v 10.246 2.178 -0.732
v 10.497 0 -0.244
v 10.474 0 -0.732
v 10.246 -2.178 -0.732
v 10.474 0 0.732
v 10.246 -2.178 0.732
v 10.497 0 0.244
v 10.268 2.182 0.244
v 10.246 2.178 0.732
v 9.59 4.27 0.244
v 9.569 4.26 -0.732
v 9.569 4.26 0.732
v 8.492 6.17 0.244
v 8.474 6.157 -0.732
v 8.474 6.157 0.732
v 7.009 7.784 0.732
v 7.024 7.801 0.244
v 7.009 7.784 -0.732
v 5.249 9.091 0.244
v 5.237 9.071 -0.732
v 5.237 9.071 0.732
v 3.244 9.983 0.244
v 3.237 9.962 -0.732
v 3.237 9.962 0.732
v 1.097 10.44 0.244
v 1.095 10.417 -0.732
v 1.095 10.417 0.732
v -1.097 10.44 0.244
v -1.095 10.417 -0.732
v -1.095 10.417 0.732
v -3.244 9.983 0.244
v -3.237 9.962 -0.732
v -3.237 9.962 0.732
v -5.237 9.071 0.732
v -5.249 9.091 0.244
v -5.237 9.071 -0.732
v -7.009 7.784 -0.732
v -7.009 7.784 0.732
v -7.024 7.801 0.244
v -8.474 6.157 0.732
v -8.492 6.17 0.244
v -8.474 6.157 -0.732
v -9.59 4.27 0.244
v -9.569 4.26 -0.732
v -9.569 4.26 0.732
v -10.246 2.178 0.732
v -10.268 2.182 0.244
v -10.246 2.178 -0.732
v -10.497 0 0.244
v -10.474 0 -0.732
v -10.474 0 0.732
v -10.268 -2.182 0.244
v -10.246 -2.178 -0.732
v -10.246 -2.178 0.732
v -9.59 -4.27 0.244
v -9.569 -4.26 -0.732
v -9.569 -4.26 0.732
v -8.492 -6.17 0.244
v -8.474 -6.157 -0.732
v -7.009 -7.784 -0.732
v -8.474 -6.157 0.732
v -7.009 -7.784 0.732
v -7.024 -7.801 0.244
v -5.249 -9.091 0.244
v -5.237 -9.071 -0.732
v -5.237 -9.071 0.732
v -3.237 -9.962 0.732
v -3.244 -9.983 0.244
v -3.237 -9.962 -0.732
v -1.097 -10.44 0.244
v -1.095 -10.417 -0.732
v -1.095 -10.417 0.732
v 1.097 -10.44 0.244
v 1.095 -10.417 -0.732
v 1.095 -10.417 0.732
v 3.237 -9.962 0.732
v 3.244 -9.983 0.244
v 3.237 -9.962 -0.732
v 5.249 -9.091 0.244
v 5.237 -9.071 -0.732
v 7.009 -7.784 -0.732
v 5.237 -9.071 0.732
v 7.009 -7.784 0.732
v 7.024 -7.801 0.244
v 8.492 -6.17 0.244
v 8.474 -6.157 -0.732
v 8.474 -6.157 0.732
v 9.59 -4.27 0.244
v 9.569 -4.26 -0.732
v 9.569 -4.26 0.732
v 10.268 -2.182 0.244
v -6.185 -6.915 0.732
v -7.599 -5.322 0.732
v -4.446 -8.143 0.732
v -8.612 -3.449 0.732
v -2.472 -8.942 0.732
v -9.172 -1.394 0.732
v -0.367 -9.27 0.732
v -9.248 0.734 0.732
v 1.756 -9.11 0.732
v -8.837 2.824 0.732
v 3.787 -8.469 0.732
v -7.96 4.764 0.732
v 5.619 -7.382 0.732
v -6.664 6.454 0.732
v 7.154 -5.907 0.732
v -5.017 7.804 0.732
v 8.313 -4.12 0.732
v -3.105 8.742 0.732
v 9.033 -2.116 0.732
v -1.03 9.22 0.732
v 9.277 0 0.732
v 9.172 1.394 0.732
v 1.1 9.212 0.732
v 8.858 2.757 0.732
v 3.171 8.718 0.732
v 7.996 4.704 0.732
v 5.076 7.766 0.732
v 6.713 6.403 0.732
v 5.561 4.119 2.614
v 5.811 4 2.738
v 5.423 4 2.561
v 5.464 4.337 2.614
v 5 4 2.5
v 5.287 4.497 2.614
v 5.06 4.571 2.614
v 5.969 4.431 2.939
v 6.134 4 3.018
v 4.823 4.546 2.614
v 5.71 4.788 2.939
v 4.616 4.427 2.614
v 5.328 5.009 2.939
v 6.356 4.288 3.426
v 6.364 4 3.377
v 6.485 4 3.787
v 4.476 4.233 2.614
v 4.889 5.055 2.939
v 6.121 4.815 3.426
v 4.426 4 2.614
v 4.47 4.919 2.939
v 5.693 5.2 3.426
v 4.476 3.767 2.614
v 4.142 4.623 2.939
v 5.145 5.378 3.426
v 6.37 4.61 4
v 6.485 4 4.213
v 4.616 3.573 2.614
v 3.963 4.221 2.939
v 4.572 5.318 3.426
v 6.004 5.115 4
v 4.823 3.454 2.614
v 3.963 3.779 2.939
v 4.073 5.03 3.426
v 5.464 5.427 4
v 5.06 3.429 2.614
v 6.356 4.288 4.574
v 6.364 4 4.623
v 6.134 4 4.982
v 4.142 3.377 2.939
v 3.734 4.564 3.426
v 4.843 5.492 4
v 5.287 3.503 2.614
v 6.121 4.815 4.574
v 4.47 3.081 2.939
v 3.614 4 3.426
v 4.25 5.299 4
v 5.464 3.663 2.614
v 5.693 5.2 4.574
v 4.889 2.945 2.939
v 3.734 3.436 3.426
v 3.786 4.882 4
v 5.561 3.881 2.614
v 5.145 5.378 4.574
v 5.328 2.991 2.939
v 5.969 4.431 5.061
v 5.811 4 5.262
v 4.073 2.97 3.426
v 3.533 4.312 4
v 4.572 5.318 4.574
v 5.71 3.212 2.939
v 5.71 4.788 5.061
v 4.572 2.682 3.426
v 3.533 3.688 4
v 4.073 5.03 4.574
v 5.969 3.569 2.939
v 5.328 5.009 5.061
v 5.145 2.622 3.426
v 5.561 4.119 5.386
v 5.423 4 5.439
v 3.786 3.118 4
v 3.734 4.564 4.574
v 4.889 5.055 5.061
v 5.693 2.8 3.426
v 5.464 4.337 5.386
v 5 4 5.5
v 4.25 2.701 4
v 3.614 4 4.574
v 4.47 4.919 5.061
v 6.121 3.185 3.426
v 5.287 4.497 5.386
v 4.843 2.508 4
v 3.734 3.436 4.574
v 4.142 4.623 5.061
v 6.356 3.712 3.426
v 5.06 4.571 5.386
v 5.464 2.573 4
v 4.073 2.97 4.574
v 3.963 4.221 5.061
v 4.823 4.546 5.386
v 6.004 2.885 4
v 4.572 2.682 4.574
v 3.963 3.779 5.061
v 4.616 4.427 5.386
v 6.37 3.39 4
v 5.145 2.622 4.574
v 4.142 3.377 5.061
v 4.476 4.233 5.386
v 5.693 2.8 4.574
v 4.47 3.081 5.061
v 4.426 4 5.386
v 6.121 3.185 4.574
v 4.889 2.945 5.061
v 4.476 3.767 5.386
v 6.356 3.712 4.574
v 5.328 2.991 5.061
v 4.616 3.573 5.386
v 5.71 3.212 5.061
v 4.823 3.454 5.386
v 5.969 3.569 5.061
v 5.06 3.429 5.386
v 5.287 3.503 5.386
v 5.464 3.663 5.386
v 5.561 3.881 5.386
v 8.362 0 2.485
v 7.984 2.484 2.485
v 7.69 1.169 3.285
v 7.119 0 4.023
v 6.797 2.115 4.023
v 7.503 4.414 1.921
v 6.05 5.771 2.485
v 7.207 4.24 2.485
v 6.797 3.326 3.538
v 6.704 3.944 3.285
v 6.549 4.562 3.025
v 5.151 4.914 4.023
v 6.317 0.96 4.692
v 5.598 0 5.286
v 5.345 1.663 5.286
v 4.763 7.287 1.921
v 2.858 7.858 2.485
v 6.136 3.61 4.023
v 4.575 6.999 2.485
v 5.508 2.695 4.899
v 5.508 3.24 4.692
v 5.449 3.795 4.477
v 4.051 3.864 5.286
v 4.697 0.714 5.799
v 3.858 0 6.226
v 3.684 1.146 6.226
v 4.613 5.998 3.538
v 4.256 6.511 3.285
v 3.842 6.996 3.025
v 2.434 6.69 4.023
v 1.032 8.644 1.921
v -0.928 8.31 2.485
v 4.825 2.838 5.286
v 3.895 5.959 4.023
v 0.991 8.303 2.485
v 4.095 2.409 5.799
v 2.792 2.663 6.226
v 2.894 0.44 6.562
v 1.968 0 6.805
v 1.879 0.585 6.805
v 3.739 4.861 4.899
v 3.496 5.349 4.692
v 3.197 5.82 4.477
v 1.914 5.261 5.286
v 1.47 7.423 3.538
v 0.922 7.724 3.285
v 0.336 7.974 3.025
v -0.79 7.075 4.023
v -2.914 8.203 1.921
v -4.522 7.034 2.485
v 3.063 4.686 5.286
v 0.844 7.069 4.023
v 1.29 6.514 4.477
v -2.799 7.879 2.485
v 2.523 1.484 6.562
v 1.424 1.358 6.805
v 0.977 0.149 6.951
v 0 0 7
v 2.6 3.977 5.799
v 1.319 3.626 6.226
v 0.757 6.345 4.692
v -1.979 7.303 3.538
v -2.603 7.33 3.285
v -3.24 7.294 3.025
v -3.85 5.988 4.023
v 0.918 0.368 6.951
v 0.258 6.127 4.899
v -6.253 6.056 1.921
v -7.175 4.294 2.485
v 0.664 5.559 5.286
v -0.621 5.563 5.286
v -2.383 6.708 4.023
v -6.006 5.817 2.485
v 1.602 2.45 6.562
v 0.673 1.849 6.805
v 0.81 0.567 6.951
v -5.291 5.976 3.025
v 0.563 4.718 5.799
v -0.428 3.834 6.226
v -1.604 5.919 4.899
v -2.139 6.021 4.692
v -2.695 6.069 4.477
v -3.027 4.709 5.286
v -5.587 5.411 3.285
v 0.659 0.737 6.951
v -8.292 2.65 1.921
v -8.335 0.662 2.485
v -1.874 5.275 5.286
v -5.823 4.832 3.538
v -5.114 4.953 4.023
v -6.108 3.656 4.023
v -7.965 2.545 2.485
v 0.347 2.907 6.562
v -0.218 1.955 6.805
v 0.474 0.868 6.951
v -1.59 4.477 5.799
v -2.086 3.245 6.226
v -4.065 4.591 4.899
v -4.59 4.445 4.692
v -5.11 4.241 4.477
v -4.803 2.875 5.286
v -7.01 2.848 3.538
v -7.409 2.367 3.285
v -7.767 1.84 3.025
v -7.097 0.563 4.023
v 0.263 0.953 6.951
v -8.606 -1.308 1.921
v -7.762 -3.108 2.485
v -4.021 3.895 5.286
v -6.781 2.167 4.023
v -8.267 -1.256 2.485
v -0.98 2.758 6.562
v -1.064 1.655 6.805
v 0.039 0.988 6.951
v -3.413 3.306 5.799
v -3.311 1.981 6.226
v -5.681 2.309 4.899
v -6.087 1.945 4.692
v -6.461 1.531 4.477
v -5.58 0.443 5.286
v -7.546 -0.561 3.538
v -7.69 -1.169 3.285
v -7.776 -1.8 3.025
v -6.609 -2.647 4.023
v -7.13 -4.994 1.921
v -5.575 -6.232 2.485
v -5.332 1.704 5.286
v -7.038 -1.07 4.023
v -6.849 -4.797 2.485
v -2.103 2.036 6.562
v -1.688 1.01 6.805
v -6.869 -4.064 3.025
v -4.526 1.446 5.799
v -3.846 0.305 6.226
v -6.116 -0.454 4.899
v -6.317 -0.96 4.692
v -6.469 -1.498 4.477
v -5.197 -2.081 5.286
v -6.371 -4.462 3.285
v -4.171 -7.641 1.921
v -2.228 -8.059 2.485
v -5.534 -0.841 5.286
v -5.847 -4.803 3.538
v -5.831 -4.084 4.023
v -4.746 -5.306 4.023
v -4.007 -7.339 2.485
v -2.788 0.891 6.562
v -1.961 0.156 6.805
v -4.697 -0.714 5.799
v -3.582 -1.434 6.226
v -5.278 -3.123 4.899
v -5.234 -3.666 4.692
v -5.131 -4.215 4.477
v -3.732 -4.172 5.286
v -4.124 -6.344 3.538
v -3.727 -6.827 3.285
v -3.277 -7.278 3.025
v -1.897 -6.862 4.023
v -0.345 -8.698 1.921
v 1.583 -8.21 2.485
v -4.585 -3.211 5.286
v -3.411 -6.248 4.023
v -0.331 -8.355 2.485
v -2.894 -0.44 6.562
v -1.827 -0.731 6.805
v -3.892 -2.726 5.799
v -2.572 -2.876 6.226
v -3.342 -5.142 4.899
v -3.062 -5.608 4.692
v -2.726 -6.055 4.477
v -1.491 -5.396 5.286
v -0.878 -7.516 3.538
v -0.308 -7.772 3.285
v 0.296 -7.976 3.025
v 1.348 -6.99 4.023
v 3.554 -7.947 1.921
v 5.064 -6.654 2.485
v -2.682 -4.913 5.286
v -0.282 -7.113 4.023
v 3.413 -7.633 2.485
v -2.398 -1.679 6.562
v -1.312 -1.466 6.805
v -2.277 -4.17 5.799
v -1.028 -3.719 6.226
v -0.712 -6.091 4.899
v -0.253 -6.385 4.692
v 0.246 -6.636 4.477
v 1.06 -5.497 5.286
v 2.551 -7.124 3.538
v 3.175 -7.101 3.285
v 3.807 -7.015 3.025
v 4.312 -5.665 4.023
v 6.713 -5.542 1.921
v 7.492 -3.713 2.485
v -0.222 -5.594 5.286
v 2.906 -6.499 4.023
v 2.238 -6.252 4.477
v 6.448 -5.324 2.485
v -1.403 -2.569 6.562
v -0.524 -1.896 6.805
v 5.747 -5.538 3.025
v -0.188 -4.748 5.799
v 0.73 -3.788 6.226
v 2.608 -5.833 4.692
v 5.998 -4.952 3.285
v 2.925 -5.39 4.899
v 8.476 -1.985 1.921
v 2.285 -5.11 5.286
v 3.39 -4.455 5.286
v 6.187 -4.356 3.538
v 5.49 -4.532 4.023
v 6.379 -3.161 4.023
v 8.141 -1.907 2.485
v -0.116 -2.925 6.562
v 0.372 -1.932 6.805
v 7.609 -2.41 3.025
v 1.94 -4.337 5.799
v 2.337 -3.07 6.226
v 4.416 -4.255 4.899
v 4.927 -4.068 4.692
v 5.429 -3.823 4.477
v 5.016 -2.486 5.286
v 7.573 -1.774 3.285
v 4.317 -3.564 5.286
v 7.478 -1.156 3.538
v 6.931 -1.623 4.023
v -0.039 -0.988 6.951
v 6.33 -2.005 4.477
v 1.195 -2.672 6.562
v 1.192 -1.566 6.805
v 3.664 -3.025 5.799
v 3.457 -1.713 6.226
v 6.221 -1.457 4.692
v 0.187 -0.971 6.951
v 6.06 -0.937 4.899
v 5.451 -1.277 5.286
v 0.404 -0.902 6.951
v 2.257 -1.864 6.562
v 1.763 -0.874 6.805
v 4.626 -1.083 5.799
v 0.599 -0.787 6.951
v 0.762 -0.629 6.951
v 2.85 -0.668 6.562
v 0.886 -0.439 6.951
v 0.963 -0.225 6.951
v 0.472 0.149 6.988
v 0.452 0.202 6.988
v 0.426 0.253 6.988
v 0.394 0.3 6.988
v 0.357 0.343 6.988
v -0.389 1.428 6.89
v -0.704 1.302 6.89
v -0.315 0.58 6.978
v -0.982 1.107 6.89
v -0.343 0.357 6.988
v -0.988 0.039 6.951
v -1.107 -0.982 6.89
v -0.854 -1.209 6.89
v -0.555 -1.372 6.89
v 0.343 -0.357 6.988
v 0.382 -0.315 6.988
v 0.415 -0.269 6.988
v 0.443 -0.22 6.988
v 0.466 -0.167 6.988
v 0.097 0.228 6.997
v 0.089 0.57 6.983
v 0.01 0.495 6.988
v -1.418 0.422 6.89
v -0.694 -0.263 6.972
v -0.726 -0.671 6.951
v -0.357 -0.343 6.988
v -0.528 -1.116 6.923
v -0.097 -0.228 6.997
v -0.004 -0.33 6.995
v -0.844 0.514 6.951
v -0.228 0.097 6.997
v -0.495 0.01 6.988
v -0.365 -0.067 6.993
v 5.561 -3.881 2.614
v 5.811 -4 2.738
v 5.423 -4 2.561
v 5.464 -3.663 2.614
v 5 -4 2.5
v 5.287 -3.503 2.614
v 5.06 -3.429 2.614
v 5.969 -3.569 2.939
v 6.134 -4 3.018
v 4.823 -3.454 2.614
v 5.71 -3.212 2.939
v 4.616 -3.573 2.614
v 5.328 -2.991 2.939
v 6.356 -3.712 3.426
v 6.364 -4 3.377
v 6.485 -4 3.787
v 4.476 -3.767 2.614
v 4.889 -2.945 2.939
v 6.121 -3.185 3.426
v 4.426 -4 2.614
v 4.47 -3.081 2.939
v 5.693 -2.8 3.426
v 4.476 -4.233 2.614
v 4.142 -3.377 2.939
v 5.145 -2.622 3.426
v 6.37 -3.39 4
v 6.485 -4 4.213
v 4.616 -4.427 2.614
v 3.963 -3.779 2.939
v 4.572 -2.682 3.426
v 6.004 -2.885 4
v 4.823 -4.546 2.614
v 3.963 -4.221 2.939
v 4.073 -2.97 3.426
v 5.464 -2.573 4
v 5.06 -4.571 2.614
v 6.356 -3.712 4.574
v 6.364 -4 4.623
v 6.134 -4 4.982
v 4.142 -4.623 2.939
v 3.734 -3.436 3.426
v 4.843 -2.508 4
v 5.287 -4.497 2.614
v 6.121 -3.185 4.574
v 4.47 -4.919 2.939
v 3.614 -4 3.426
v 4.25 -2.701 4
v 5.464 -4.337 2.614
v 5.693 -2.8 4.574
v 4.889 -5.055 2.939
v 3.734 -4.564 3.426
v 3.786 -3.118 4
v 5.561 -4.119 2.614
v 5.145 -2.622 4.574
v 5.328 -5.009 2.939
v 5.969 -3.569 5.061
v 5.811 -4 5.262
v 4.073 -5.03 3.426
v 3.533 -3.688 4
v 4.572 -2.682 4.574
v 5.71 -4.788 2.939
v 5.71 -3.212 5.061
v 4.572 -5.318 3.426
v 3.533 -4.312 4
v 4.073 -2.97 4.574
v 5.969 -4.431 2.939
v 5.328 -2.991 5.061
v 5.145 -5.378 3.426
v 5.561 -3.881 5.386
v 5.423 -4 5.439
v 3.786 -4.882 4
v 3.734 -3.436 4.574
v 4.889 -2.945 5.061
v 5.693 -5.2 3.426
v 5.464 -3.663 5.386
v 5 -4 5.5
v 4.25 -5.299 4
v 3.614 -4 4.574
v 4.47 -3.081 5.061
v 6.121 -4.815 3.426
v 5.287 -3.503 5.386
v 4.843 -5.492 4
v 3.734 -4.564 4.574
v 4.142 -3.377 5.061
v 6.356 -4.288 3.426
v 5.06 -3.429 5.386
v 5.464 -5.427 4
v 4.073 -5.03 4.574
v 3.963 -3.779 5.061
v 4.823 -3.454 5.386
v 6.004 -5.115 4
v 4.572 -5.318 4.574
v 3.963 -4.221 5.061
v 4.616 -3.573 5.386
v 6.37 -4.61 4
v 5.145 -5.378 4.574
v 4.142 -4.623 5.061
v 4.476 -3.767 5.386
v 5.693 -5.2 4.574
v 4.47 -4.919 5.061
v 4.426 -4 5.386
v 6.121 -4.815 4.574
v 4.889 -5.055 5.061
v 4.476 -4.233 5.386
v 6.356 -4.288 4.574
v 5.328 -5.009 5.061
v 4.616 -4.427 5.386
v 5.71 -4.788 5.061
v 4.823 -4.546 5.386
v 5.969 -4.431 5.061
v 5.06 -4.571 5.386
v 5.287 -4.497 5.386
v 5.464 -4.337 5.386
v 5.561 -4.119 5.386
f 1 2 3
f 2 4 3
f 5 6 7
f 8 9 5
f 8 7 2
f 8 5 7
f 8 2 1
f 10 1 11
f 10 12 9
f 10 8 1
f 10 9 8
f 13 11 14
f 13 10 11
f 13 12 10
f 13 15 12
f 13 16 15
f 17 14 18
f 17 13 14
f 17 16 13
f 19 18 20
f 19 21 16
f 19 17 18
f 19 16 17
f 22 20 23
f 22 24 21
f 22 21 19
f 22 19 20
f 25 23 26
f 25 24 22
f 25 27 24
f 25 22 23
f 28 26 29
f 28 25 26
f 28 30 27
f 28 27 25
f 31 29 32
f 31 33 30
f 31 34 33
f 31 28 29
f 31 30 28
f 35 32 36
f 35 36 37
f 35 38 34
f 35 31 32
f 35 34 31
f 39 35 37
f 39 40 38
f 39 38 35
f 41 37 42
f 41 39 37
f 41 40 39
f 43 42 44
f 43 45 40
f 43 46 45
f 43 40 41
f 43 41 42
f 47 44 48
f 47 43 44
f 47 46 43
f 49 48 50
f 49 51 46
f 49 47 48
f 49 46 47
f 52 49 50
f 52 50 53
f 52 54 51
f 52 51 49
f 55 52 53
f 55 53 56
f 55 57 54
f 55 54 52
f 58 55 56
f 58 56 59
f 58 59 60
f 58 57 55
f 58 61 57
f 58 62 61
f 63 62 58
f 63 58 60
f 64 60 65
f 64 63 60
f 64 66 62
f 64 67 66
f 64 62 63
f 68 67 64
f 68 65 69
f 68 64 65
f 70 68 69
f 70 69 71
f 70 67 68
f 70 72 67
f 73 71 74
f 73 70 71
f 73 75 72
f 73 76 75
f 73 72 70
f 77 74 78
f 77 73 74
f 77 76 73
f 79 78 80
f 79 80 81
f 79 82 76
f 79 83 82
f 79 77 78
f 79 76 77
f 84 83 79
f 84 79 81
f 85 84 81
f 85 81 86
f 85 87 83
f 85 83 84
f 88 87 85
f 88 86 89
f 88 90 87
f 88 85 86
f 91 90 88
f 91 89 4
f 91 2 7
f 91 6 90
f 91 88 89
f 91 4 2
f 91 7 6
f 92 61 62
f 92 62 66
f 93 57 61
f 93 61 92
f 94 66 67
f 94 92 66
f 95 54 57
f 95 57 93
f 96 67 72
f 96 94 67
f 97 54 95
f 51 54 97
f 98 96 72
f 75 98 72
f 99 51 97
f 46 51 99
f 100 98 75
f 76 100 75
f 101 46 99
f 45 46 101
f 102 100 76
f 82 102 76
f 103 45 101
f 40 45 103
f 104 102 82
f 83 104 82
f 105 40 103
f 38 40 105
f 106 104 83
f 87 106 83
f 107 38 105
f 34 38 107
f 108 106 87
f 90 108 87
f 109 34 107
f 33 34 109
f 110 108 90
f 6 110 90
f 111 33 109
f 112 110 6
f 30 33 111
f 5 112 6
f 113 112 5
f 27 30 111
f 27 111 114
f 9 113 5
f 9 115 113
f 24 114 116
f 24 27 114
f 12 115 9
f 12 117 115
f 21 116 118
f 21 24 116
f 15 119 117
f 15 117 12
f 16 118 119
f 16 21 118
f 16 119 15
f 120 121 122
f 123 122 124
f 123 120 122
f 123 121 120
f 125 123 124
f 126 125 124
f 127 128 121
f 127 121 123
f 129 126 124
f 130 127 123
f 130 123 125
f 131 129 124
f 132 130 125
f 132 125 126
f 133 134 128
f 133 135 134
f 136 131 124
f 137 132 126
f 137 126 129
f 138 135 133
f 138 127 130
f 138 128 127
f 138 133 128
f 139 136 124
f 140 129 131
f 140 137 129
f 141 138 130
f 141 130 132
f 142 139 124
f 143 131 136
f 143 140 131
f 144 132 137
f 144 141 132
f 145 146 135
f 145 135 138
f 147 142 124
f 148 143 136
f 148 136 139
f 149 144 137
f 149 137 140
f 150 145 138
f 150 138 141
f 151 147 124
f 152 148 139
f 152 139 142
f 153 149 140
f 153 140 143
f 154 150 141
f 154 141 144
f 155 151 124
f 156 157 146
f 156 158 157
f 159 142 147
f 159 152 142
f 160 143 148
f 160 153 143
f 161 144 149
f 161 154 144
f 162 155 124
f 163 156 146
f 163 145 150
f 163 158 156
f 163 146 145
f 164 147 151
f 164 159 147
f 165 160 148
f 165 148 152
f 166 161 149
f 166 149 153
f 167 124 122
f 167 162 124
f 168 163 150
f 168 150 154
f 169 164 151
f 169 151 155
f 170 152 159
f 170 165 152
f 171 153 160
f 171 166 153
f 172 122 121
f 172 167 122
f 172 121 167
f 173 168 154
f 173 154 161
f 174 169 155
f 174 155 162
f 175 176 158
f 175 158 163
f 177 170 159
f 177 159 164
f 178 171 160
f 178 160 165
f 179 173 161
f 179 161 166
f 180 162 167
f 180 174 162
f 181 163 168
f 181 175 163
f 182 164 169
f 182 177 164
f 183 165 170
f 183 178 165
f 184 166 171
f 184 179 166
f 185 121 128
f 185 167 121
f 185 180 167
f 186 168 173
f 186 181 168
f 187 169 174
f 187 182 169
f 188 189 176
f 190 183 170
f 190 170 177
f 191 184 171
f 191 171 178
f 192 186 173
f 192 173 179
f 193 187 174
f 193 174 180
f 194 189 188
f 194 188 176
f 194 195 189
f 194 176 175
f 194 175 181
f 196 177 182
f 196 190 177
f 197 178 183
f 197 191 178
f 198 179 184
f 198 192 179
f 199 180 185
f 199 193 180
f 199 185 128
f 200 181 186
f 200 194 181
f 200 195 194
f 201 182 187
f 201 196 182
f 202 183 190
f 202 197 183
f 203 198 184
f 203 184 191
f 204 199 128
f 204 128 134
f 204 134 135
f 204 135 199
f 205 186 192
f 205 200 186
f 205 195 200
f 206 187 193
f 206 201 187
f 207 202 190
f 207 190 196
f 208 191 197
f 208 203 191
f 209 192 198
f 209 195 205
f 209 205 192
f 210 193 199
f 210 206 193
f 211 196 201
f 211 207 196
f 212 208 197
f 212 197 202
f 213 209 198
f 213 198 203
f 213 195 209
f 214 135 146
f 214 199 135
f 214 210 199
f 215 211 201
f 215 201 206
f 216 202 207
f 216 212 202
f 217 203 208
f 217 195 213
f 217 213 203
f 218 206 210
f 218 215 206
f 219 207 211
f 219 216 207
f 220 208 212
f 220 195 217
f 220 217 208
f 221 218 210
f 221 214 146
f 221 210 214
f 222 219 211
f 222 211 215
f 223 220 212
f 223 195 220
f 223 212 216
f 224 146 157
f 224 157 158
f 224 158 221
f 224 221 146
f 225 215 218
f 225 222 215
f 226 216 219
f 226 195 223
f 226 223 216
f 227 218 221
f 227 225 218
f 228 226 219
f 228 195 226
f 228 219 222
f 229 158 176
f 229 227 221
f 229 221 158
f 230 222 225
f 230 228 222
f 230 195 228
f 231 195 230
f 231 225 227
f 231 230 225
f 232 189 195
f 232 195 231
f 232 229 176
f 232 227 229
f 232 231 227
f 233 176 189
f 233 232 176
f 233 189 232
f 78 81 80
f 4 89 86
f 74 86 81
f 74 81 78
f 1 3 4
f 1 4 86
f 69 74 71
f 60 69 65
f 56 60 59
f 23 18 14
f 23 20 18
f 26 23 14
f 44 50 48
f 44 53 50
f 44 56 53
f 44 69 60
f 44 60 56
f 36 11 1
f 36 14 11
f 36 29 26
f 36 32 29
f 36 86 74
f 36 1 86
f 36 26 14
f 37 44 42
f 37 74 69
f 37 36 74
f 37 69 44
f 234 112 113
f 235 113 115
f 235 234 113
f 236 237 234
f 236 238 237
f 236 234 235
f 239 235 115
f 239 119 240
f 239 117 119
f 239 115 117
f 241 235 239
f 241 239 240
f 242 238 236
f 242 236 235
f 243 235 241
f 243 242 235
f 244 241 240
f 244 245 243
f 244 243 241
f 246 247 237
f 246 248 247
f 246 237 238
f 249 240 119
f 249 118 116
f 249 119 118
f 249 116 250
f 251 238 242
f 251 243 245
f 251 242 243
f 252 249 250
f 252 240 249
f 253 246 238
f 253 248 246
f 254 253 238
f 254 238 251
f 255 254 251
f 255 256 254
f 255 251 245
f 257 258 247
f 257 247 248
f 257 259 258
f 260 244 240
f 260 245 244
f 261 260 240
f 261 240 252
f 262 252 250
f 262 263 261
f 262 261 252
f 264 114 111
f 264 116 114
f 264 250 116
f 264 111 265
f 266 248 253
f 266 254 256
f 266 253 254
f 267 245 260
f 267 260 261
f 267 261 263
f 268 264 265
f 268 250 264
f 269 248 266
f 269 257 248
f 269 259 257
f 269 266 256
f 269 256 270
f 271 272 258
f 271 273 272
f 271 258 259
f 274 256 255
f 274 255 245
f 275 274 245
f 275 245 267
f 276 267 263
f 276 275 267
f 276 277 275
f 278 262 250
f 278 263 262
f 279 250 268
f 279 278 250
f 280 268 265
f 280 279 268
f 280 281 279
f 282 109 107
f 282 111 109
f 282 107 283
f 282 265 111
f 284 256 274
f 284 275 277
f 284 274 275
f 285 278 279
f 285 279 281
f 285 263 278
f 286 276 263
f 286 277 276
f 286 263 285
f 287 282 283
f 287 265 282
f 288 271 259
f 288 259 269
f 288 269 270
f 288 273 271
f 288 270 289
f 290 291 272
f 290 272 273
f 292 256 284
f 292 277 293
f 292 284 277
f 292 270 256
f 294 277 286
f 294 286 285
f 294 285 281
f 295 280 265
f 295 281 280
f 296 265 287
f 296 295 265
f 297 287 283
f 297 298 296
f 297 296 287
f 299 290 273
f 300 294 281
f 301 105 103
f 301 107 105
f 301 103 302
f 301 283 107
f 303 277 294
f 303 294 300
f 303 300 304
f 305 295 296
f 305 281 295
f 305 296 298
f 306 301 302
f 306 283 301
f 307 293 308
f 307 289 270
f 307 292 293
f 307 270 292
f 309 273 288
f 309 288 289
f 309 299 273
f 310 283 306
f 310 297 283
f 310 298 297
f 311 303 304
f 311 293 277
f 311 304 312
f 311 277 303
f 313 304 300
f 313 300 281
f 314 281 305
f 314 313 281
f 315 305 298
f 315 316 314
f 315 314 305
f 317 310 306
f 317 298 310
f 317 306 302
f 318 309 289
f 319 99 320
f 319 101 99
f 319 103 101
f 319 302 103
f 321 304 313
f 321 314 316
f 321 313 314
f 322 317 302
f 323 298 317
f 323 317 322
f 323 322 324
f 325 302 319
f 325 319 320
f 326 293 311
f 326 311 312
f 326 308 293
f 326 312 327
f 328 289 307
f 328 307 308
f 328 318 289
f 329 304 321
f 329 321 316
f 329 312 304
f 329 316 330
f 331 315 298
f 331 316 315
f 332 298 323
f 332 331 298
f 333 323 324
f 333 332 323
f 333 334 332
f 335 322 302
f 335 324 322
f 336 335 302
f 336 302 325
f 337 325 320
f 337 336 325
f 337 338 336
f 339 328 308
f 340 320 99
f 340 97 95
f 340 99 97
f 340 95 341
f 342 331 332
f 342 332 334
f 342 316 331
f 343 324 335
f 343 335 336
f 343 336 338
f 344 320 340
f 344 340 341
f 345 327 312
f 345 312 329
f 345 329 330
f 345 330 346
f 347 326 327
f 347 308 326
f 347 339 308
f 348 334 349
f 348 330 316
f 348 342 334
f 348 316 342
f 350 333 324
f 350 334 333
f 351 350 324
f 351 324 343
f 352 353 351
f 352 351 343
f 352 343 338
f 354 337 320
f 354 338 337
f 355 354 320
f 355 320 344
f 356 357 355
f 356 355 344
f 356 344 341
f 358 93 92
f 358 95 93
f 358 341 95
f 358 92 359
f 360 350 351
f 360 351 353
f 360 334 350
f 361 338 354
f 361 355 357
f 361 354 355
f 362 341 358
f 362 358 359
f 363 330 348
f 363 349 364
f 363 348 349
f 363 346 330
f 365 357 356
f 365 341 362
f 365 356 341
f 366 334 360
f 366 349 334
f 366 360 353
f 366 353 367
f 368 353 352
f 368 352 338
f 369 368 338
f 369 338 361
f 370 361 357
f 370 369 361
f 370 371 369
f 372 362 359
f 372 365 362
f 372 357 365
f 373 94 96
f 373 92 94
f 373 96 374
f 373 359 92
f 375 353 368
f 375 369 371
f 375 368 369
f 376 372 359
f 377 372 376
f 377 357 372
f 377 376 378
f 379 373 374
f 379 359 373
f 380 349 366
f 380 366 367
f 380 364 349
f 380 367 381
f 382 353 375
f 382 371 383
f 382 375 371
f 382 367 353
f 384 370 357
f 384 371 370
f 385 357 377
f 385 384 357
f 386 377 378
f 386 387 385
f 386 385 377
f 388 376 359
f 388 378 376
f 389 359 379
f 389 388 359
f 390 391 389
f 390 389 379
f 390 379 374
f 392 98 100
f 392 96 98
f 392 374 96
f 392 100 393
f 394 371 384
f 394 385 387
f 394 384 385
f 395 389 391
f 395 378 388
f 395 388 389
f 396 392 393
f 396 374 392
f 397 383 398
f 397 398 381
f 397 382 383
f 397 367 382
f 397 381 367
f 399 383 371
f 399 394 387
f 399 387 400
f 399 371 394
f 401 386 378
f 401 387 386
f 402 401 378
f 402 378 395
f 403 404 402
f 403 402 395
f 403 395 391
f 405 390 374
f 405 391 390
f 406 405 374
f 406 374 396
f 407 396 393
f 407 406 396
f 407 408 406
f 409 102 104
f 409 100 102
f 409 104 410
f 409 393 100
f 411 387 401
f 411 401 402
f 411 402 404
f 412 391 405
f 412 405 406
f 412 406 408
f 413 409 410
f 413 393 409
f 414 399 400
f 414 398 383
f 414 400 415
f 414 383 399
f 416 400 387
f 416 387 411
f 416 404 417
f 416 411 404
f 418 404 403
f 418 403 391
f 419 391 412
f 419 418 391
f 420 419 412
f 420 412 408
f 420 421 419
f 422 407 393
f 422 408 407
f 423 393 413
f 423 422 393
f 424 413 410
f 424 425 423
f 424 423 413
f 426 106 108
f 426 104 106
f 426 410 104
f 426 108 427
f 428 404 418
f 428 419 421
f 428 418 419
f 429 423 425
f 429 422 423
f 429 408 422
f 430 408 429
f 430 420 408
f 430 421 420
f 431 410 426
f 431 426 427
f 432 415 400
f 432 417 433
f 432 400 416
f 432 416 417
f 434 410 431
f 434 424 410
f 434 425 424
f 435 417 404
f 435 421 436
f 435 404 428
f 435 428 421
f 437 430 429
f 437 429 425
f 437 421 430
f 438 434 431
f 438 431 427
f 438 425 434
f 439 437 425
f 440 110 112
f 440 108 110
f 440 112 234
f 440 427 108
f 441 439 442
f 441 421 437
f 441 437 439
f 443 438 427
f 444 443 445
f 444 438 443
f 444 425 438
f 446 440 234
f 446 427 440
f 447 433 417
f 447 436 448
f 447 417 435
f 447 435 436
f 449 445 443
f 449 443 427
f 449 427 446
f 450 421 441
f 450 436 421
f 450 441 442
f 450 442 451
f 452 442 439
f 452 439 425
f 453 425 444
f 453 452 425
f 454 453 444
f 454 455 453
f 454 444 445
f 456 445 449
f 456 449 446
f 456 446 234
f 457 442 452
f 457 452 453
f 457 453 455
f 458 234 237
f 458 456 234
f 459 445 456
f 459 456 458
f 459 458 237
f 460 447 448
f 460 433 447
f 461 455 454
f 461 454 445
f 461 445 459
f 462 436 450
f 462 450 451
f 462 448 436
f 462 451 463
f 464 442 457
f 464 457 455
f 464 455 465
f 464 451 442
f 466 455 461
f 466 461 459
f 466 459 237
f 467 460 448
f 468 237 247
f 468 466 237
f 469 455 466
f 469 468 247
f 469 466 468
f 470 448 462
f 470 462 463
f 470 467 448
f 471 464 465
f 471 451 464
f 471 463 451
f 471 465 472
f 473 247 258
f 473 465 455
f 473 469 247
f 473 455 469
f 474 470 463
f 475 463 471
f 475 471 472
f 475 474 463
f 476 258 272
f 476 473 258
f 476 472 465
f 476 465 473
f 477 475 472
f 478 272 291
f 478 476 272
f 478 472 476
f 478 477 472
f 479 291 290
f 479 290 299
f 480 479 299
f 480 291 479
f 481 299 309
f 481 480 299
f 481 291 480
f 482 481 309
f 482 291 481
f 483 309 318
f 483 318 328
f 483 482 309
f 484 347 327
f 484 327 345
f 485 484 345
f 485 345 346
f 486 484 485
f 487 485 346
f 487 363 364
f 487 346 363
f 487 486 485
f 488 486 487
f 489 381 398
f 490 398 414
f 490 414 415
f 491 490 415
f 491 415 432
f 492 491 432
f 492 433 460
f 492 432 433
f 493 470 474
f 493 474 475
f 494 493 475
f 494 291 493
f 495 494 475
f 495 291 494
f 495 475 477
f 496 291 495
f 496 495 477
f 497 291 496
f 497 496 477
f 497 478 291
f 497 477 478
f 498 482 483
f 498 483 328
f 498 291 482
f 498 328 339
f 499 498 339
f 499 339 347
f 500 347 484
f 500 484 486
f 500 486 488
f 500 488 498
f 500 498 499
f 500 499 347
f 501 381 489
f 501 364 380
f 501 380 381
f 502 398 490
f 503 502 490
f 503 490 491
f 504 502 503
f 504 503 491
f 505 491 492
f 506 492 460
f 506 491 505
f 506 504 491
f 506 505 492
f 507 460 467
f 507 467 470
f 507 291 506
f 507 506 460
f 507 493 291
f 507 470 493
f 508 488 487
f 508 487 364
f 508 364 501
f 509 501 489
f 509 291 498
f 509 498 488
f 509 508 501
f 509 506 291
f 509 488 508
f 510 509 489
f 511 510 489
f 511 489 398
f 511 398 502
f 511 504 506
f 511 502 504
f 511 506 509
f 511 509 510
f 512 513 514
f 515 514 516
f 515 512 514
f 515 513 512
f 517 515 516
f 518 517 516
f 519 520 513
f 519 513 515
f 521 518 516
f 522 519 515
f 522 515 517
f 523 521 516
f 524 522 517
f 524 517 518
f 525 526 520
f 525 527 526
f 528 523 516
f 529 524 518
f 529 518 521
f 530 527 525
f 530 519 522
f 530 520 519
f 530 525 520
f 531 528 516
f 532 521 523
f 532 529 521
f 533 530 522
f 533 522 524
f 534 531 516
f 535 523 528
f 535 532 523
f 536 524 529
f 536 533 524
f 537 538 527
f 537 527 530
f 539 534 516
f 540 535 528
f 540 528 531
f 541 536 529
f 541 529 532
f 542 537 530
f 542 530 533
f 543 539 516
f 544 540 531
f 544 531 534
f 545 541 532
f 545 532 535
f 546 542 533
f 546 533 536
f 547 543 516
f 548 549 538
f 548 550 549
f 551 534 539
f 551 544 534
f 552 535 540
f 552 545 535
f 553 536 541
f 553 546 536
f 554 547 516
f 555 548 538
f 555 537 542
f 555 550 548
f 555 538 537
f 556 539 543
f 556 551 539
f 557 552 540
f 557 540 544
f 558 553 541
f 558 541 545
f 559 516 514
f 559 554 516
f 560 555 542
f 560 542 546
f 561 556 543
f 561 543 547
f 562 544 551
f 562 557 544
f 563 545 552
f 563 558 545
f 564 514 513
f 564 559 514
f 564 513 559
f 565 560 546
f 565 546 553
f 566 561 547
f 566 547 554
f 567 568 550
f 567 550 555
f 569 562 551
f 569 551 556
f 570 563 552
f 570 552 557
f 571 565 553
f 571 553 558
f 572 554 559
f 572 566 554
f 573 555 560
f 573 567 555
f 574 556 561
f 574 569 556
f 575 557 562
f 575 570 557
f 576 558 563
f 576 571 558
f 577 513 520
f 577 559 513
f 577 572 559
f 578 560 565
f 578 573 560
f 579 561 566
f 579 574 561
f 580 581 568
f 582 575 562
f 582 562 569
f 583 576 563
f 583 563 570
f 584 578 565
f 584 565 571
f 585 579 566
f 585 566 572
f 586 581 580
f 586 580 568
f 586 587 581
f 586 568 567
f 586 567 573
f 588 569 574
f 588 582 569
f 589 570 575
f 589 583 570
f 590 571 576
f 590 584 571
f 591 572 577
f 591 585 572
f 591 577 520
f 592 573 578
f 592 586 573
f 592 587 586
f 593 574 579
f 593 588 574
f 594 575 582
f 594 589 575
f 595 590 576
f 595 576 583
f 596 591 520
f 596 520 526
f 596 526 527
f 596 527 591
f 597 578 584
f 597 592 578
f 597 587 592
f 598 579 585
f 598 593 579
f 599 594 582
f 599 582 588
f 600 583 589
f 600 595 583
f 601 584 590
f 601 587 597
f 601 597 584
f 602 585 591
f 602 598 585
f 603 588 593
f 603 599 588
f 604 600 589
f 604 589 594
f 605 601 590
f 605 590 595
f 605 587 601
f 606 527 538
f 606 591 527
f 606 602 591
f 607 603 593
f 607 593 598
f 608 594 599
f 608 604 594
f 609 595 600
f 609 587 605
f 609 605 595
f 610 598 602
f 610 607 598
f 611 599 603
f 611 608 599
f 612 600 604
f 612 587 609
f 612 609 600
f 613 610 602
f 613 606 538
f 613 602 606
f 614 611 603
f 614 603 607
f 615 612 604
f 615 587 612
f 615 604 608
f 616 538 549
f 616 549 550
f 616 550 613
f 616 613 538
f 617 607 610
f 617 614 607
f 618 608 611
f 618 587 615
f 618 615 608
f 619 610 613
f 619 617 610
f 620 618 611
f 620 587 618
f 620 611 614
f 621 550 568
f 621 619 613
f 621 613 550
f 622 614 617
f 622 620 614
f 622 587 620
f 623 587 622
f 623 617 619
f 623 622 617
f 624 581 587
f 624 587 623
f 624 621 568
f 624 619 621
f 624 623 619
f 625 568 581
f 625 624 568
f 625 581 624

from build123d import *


with BuildPart() as base:
    # Sphere001 → Sphere001 (revolve)
    with BuildSketch(Plane.XZ):
        with BuildLine():
            ThreePointArc((10.474423, -0.732443), (10.5, 0), (10.474423, 0.732443))
            Line((10.474423, 0.732443), (0, 0.732443))
            Line((0, 0.732443), (0, -0.732443))
            Line((0, -0.732443), (10.474423, -0.732443))
        make_face()
    revolve(axis=Axis((0, 0, 0), (0, 0, 1)))


with BuildPart() as fusion:
    # Sphere → Sphere (revolve)
    with BuildSketch(Plane(origin=(0, 0, -3), x_dir=(1, 0, 0), z_dir=(0, -1, 0))):
        with BuildLine():
            ThreePointArc((9.396926, 3.420201), (5.735764, 8.19152), (0, 10))
            Line((0, 10), (0, 3.420201))
            Line((0, 3.420201), (9.396926, 3.420201))
        make_face()
    revolve(axis=Axis((0, 0, -3), (0, 0, 1)))

    # Fusion: union base
    add(base.part)


with BuildPart() as ull1:
    # Sphere002 → Sphere002 (revolve)
    with BuildSketch(Plane(origin=(5, 4, 4), x_dir=(1, 0, 0), z_dir=(0, -1, 0))):
        with BuildLine():
            ThreePointArc((0, -1.5), (1.5, 0), (0, 1.5))
            Line((0, 1.5), (0, -1.5))
        make_face()
    revolve(axis=Axis((5, 4, 4), (0, 0, 1)))


with BuildPart() as ull2:
    # Sphere003 → Sphere003 (revolve)
    with BuildSketch(Plane(origin=(5, -4, 4), x_dir=(1, 0, 0), z_dir=(0, -1, 0))):
        with BuildLine():
            ThreePointArc((0, -1.5), (1.5, 0), (0, 1.5))
            Line((0, 1.5), (0, -1.5))
        make_face()
    revolve(axis=Axis((5, -4, 4), (0, 0, 1)))


solid = Compound([fusion.part, ull1.part, ull2.part])
